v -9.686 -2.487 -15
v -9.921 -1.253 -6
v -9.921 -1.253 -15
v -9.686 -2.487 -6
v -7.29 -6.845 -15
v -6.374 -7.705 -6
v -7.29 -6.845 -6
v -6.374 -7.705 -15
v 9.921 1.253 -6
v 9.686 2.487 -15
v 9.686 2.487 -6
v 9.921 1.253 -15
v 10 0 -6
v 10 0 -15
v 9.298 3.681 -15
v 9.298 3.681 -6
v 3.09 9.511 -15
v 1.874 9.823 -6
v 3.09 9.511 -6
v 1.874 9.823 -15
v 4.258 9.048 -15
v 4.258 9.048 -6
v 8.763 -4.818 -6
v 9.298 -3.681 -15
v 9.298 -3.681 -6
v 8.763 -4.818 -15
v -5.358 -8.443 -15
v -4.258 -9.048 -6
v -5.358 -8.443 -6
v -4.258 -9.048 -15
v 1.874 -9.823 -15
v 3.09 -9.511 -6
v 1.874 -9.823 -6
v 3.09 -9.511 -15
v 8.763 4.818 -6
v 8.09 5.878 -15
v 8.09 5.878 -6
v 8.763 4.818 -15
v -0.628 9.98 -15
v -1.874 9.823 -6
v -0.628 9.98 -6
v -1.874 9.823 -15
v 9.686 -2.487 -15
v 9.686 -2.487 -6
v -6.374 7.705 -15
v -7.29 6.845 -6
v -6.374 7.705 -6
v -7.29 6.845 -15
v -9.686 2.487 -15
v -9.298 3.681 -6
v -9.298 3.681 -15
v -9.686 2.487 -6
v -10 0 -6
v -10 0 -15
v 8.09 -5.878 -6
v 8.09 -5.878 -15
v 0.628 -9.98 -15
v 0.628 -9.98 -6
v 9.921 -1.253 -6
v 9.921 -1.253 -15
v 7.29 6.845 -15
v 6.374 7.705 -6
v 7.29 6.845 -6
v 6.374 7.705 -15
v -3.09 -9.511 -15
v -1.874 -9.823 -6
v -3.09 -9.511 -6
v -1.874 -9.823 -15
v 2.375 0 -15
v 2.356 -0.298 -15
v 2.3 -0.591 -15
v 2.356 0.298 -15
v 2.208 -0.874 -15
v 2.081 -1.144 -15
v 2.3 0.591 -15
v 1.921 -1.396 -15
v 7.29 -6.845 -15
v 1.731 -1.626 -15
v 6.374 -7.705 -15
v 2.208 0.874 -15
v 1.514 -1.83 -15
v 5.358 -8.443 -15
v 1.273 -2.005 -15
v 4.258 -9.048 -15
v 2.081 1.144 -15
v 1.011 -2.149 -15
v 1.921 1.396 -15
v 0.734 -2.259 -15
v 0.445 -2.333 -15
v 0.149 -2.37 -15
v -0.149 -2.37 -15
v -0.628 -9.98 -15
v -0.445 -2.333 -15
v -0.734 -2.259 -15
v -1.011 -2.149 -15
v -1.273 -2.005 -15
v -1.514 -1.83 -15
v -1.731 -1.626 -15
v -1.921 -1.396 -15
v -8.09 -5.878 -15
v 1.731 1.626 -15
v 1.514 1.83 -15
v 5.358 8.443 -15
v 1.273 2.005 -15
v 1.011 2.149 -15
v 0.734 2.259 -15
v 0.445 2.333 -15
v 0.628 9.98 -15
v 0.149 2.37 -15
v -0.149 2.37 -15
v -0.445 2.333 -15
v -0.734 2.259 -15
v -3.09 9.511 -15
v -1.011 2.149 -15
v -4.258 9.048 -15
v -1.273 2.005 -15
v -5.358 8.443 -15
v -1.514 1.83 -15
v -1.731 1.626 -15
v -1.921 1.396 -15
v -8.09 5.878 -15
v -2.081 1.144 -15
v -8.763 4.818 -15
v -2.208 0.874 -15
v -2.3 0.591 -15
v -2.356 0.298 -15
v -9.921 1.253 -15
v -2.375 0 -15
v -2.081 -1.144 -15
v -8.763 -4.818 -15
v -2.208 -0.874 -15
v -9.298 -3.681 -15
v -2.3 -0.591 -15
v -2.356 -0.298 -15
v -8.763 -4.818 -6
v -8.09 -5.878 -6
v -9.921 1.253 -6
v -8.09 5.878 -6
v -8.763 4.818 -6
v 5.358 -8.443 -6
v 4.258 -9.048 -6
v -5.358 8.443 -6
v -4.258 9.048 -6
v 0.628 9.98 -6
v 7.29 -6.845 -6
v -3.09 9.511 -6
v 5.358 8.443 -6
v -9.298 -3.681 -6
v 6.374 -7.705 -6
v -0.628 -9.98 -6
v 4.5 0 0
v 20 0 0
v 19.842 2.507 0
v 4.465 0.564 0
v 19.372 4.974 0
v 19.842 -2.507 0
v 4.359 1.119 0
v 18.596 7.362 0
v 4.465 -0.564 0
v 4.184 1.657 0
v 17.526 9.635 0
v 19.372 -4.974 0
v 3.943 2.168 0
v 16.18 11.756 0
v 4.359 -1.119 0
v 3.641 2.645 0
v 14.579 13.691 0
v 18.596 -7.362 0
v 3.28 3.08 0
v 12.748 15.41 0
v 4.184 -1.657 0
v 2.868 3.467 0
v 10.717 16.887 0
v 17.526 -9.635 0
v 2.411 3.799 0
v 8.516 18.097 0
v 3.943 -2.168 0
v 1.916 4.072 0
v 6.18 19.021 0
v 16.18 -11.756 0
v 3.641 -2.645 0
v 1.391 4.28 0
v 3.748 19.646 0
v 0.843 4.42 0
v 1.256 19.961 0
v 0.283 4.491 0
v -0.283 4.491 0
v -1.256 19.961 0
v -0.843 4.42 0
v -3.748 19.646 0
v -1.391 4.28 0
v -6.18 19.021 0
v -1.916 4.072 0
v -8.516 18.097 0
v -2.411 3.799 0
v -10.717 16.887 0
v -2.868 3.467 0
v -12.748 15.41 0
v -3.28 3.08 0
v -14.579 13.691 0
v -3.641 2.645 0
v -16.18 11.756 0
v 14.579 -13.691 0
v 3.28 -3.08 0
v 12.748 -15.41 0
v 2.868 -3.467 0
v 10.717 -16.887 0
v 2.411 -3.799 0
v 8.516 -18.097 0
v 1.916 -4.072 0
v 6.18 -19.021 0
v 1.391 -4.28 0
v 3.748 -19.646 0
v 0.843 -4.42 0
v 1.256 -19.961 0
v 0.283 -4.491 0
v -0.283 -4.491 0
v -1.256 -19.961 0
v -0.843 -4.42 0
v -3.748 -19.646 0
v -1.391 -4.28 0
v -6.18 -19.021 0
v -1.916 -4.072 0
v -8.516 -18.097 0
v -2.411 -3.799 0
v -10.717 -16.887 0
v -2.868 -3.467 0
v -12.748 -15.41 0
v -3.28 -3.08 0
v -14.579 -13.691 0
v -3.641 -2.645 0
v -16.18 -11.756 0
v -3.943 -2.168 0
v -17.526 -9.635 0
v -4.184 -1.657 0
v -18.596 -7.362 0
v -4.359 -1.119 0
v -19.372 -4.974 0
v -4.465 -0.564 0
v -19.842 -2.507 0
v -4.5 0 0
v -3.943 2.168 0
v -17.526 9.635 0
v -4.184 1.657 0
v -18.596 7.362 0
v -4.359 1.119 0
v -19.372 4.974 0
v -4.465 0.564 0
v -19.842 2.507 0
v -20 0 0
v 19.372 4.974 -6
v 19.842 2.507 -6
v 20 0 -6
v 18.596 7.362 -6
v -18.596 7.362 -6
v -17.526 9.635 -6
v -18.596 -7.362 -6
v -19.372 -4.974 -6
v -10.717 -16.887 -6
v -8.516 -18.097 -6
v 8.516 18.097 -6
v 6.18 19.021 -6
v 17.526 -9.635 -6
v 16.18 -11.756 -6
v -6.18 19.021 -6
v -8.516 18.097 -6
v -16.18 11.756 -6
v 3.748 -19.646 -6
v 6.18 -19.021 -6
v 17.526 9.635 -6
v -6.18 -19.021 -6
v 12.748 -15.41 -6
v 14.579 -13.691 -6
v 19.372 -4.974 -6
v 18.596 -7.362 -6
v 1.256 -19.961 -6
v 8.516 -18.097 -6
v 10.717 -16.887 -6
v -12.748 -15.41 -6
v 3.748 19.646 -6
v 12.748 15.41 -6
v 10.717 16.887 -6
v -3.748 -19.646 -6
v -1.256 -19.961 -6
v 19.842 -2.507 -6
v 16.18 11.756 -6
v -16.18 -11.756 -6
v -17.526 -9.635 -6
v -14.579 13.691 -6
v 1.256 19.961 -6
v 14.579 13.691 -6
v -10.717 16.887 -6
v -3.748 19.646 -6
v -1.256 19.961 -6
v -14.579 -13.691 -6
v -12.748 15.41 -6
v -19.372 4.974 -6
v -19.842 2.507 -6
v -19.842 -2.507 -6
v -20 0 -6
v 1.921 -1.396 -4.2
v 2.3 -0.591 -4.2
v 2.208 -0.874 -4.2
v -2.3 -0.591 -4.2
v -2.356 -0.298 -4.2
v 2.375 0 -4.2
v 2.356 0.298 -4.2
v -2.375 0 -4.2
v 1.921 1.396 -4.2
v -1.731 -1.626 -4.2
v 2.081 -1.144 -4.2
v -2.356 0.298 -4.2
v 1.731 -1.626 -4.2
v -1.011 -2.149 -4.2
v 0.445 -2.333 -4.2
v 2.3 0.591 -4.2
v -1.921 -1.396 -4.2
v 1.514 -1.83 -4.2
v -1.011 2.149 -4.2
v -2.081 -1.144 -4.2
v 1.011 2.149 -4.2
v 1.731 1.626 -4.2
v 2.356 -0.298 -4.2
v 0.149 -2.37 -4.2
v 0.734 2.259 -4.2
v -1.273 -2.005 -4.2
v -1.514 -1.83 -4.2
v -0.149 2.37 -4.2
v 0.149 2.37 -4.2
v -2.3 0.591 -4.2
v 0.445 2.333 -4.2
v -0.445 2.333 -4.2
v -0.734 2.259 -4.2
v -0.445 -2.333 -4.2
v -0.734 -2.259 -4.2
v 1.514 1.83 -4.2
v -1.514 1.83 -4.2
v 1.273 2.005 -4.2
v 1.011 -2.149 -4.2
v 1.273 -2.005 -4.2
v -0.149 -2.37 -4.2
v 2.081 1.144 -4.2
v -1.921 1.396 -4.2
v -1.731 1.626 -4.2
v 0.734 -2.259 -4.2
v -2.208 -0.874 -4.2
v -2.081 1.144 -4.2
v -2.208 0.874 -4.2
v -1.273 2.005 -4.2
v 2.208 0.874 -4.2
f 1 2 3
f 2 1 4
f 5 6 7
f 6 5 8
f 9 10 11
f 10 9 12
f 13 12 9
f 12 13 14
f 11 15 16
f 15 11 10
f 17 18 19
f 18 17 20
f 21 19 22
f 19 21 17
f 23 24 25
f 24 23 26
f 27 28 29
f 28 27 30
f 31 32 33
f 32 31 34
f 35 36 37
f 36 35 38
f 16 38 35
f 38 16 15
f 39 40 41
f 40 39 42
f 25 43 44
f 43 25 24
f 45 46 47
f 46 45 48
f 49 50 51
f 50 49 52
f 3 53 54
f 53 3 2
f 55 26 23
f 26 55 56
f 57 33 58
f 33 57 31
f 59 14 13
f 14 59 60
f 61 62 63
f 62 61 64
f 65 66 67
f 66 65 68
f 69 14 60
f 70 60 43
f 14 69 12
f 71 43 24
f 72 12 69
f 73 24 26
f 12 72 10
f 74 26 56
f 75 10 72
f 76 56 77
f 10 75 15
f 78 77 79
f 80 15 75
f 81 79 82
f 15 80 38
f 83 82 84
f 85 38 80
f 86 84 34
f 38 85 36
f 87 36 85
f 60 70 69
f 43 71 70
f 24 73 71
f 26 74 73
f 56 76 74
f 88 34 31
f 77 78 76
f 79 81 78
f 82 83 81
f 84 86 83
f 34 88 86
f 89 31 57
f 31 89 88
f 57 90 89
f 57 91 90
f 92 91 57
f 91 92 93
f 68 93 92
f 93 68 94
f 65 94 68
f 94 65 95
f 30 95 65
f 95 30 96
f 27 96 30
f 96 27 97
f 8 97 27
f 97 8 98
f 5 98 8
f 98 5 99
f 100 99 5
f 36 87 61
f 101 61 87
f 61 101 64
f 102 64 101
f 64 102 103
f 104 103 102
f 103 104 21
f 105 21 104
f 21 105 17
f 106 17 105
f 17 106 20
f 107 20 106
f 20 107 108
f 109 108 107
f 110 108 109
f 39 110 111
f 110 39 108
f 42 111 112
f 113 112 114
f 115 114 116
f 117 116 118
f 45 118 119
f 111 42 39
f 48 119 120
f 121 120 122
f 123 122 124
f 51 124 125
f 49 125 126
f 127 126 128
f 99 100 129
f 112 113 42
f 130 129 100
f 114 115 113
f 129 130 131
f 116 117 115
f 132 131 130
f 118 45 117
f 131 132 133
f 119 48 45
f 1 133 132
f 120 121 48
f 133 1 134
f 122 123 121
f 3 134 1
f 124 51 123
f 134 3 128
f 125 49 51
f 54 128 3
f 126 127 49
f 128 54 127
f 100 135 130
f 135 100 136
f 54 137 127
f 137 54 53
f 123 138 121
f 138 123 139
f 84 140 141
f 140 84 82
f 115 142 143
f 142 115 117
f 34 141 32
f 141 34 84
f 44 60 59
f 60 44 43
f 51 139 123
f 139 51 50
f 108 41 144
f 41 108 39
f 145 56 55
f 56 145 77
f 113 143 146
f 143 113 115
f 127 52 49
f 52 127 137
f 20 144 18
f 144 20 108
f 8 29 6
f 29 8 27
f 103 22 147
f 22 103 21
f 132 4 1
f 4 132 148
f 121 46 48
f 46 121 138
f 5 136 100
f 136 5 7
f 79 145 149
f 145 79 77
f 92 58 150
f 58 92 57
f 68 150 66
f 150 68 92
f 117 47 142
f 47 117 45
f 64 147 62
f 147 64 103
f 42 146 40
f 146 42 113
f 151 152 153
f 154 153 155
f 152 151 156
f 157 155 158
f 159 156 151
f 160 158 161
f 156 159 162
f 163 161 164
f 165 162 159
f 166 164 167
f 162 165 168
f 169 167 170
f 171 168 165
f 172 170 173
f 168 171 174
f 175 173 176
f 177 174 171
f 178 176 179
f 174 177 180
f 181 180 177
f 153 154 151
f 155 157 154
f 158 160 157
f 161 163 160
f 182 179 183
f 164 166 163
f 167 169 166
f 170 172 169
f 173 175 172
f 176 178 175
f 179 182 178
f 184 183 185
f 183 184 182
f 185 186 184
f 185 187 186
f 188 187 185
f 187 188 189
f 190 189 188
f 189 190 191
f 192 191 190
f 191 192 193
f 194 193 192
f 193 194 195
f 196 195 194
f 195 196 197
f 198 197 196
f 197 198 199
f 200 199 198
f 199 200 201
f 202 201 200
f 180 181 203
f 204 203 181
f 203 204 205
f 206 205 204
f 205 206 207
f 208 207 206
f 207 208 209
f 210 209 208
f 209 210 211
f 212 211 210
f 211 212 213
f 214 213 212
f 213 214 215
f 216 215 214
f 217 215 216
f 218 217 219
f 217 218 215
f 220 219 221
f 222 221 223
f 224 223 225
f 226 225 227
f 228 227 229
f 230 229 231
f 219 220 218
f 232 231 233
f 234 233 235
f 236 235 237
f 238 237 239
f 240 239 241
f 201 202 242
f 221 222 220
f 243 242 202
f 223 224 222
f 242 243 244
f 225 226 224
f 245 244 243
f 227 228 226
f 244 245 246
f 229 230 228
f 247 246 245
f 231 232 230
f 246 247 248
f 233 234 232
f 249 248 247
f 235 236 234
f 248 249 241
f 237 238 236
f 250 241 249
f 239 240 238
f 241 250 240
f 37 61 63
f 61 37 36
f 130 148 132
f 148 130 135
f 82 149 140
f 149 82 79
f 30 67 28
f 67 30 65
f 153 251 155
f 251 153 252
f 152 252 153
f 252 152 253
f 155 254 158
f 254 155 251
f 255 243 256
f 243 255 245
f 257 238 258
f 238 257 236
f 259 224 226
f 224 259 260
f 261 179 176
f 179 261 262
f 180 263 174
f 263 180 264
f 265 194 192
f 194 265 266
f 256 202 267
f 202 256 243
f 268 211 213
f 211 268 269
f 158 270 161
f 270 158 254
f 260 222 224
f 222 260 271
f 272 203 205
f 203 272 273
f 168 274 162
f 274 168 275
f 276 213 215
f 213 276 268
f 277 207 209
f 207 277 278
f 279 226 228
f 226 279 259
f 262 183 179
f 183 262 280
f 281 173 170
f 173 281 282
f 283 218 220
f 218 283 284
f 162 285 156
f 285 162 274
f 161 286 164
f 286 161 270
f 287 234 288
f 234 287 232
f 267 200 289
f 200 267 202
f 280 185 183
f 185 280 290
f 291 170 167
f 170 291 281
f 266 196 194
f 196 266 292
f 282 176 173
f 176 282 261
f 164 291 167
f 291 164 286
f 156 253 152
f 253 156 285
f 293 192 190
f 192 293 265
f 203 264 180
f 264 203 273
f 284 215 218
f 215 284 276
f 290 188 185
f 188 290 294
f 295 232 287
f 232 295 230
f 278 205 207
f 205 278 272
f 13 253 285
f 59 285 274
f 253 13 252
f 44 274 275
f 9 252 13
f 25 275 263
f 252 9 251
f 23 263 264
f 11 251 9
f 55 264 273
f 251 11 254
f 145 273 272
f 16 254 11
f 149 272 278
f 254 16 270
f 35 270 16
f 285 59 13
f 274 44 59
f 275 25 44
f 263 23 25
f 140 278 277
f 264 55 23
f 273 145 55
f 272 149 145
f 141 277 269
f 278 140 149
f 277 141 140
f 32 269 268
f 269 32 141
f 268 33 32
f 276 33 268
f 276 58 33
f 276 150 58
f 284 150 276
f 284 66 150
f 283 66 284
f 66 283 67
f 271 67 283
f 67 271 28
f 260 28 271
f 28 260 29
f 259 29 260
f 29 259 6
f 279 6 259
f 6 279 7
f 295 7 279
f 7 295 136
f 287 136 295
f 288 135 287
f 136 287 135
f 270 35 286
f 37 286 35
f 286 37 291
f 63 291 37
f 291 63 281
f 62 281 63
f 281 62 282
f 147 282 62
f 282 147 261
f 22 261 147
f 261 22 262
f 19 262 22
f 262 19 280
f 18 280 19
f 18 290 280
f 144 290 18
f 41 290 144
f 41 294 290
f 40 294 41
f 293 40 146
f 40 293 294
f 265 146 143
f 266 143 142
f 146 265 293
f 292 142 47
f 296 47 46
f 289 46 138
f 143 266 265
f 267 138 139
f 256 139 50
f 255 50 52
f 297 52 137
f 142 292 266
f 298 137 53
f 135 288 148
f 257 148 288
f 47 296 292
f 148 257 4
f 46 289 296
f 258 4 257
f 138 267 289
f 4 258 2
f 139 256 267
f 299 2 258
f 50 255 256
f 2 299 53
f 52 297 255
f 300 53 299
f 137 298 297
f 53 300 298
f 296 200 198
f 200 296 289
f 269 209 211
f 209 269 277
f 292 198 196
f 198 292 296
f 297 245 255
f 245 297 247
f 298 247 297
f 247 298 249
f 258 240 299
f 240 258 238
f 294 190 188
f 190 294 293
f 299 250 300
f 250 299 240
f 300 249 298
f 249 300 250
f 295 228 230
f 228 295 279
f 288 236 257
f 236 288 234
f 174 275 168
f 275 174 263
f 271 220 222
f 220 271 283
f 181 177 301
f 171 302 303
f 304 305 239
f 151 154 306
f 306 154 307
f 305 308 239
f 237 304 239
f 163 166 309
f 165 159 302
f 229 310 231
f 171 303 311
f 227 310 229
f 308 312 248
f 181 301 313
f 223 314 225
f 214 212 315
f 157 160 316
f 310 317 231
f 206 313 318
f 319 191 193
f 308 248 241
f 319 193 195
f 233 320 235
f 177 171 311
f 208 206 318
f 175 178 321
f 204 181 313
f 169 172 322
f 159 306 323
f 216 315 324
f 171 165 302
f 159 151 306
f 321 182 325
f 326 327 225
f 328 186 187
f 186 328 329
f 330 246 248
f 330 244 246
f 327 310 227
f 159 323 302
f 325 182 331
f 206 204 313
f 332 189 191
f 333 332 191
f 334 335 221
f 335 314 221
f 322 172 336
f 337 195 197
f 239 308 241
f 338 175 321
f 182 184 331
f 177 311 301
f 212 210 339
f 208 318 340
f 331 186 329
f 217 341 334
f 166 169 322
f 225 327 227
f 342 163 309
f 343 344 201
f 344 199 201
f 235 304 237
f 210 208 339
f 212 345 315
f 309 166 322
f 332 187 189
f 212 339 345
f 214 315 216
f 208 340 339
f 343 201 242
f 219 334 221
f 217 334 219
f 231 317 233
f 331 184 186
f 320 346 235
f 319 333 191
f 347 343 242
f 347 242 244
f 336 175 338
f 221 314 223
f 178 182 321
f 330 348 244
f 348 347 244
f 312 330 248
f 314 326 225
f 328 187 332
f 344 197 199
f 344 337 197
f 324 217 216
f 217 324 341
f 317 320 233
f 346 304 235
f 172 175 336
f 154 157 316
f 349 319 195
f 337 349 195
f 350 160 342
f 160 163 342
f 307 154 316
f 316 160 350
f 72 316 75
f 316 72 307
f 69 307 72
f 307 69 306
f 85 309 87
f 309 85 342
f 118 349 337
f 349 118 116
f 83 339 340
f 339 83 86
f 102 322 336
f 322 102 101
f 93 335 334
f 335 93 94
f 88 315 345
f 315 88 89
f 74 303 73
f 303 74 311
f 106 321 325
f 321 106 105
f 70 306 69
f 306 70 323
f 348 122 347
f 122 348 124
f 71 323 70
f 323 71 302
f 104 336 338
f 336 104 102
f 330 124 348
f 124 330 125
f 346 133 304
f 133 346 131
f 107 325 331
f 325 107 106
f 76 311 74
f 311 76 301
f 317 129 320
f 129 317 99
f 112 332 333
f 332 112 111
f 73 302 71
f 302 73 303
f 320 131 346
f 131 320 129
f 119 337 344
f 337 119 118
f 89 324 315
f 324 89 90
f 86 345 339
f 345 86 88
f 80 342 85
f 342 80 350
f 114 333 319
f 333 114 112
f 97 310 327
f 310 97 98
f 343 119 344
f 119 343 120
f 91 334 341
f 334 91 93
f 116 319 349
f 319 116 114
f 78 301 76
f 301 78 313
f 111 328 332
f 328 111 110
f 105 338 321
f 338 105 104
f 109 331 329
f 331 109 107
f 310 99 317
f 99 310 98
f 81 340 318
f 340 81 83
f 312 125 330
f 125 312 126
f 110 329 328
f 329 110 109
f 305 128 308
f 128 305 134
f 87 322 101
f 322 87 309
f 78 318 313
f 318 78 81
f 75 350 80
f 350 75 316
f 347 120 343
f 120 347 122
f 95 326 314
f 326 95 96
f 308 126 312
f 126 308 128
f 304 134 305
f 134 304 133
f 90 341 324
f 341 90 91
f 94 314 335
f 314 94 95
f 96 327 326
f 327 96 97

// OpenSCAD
$fn = 50;


difference() {
	union() {
		translate(v = [0, 0, -15.0000000000]) {
			cylinder(h = 15, r = 10.0000000000);
		}
		translate(v = [0, 0, -6.0000000000]) {
			cylinder(h = 6, r = 20.0000000000);
		}
	}
	union() {
		translate(v = [0, 0, 0]) {
			rotate(a = [0, 0, 0]) {
				difference() {
					union() {
						#translate(v = [0, 0, -15.0000000000]) {
							cylinder(h = 15, r = 2.2500000000);
						}
						#translate(v = [0, 0, -4.2000000000]) {
							cylinder(h = 4.2000000000, r1 = 2.3750000000, r2 = 4.5000000000);
						}
						#translate(v = [0, 0, -15.0000000000]) {
							cylinder(h = 15, r = 2.3750000000);
						}
						#translate(v = [0, 0, -15.0000000000]) {
							cylinder(h = 15, r = 2.2500000000);
						}
					}
					union();
				}
			}
		}
	}
}
